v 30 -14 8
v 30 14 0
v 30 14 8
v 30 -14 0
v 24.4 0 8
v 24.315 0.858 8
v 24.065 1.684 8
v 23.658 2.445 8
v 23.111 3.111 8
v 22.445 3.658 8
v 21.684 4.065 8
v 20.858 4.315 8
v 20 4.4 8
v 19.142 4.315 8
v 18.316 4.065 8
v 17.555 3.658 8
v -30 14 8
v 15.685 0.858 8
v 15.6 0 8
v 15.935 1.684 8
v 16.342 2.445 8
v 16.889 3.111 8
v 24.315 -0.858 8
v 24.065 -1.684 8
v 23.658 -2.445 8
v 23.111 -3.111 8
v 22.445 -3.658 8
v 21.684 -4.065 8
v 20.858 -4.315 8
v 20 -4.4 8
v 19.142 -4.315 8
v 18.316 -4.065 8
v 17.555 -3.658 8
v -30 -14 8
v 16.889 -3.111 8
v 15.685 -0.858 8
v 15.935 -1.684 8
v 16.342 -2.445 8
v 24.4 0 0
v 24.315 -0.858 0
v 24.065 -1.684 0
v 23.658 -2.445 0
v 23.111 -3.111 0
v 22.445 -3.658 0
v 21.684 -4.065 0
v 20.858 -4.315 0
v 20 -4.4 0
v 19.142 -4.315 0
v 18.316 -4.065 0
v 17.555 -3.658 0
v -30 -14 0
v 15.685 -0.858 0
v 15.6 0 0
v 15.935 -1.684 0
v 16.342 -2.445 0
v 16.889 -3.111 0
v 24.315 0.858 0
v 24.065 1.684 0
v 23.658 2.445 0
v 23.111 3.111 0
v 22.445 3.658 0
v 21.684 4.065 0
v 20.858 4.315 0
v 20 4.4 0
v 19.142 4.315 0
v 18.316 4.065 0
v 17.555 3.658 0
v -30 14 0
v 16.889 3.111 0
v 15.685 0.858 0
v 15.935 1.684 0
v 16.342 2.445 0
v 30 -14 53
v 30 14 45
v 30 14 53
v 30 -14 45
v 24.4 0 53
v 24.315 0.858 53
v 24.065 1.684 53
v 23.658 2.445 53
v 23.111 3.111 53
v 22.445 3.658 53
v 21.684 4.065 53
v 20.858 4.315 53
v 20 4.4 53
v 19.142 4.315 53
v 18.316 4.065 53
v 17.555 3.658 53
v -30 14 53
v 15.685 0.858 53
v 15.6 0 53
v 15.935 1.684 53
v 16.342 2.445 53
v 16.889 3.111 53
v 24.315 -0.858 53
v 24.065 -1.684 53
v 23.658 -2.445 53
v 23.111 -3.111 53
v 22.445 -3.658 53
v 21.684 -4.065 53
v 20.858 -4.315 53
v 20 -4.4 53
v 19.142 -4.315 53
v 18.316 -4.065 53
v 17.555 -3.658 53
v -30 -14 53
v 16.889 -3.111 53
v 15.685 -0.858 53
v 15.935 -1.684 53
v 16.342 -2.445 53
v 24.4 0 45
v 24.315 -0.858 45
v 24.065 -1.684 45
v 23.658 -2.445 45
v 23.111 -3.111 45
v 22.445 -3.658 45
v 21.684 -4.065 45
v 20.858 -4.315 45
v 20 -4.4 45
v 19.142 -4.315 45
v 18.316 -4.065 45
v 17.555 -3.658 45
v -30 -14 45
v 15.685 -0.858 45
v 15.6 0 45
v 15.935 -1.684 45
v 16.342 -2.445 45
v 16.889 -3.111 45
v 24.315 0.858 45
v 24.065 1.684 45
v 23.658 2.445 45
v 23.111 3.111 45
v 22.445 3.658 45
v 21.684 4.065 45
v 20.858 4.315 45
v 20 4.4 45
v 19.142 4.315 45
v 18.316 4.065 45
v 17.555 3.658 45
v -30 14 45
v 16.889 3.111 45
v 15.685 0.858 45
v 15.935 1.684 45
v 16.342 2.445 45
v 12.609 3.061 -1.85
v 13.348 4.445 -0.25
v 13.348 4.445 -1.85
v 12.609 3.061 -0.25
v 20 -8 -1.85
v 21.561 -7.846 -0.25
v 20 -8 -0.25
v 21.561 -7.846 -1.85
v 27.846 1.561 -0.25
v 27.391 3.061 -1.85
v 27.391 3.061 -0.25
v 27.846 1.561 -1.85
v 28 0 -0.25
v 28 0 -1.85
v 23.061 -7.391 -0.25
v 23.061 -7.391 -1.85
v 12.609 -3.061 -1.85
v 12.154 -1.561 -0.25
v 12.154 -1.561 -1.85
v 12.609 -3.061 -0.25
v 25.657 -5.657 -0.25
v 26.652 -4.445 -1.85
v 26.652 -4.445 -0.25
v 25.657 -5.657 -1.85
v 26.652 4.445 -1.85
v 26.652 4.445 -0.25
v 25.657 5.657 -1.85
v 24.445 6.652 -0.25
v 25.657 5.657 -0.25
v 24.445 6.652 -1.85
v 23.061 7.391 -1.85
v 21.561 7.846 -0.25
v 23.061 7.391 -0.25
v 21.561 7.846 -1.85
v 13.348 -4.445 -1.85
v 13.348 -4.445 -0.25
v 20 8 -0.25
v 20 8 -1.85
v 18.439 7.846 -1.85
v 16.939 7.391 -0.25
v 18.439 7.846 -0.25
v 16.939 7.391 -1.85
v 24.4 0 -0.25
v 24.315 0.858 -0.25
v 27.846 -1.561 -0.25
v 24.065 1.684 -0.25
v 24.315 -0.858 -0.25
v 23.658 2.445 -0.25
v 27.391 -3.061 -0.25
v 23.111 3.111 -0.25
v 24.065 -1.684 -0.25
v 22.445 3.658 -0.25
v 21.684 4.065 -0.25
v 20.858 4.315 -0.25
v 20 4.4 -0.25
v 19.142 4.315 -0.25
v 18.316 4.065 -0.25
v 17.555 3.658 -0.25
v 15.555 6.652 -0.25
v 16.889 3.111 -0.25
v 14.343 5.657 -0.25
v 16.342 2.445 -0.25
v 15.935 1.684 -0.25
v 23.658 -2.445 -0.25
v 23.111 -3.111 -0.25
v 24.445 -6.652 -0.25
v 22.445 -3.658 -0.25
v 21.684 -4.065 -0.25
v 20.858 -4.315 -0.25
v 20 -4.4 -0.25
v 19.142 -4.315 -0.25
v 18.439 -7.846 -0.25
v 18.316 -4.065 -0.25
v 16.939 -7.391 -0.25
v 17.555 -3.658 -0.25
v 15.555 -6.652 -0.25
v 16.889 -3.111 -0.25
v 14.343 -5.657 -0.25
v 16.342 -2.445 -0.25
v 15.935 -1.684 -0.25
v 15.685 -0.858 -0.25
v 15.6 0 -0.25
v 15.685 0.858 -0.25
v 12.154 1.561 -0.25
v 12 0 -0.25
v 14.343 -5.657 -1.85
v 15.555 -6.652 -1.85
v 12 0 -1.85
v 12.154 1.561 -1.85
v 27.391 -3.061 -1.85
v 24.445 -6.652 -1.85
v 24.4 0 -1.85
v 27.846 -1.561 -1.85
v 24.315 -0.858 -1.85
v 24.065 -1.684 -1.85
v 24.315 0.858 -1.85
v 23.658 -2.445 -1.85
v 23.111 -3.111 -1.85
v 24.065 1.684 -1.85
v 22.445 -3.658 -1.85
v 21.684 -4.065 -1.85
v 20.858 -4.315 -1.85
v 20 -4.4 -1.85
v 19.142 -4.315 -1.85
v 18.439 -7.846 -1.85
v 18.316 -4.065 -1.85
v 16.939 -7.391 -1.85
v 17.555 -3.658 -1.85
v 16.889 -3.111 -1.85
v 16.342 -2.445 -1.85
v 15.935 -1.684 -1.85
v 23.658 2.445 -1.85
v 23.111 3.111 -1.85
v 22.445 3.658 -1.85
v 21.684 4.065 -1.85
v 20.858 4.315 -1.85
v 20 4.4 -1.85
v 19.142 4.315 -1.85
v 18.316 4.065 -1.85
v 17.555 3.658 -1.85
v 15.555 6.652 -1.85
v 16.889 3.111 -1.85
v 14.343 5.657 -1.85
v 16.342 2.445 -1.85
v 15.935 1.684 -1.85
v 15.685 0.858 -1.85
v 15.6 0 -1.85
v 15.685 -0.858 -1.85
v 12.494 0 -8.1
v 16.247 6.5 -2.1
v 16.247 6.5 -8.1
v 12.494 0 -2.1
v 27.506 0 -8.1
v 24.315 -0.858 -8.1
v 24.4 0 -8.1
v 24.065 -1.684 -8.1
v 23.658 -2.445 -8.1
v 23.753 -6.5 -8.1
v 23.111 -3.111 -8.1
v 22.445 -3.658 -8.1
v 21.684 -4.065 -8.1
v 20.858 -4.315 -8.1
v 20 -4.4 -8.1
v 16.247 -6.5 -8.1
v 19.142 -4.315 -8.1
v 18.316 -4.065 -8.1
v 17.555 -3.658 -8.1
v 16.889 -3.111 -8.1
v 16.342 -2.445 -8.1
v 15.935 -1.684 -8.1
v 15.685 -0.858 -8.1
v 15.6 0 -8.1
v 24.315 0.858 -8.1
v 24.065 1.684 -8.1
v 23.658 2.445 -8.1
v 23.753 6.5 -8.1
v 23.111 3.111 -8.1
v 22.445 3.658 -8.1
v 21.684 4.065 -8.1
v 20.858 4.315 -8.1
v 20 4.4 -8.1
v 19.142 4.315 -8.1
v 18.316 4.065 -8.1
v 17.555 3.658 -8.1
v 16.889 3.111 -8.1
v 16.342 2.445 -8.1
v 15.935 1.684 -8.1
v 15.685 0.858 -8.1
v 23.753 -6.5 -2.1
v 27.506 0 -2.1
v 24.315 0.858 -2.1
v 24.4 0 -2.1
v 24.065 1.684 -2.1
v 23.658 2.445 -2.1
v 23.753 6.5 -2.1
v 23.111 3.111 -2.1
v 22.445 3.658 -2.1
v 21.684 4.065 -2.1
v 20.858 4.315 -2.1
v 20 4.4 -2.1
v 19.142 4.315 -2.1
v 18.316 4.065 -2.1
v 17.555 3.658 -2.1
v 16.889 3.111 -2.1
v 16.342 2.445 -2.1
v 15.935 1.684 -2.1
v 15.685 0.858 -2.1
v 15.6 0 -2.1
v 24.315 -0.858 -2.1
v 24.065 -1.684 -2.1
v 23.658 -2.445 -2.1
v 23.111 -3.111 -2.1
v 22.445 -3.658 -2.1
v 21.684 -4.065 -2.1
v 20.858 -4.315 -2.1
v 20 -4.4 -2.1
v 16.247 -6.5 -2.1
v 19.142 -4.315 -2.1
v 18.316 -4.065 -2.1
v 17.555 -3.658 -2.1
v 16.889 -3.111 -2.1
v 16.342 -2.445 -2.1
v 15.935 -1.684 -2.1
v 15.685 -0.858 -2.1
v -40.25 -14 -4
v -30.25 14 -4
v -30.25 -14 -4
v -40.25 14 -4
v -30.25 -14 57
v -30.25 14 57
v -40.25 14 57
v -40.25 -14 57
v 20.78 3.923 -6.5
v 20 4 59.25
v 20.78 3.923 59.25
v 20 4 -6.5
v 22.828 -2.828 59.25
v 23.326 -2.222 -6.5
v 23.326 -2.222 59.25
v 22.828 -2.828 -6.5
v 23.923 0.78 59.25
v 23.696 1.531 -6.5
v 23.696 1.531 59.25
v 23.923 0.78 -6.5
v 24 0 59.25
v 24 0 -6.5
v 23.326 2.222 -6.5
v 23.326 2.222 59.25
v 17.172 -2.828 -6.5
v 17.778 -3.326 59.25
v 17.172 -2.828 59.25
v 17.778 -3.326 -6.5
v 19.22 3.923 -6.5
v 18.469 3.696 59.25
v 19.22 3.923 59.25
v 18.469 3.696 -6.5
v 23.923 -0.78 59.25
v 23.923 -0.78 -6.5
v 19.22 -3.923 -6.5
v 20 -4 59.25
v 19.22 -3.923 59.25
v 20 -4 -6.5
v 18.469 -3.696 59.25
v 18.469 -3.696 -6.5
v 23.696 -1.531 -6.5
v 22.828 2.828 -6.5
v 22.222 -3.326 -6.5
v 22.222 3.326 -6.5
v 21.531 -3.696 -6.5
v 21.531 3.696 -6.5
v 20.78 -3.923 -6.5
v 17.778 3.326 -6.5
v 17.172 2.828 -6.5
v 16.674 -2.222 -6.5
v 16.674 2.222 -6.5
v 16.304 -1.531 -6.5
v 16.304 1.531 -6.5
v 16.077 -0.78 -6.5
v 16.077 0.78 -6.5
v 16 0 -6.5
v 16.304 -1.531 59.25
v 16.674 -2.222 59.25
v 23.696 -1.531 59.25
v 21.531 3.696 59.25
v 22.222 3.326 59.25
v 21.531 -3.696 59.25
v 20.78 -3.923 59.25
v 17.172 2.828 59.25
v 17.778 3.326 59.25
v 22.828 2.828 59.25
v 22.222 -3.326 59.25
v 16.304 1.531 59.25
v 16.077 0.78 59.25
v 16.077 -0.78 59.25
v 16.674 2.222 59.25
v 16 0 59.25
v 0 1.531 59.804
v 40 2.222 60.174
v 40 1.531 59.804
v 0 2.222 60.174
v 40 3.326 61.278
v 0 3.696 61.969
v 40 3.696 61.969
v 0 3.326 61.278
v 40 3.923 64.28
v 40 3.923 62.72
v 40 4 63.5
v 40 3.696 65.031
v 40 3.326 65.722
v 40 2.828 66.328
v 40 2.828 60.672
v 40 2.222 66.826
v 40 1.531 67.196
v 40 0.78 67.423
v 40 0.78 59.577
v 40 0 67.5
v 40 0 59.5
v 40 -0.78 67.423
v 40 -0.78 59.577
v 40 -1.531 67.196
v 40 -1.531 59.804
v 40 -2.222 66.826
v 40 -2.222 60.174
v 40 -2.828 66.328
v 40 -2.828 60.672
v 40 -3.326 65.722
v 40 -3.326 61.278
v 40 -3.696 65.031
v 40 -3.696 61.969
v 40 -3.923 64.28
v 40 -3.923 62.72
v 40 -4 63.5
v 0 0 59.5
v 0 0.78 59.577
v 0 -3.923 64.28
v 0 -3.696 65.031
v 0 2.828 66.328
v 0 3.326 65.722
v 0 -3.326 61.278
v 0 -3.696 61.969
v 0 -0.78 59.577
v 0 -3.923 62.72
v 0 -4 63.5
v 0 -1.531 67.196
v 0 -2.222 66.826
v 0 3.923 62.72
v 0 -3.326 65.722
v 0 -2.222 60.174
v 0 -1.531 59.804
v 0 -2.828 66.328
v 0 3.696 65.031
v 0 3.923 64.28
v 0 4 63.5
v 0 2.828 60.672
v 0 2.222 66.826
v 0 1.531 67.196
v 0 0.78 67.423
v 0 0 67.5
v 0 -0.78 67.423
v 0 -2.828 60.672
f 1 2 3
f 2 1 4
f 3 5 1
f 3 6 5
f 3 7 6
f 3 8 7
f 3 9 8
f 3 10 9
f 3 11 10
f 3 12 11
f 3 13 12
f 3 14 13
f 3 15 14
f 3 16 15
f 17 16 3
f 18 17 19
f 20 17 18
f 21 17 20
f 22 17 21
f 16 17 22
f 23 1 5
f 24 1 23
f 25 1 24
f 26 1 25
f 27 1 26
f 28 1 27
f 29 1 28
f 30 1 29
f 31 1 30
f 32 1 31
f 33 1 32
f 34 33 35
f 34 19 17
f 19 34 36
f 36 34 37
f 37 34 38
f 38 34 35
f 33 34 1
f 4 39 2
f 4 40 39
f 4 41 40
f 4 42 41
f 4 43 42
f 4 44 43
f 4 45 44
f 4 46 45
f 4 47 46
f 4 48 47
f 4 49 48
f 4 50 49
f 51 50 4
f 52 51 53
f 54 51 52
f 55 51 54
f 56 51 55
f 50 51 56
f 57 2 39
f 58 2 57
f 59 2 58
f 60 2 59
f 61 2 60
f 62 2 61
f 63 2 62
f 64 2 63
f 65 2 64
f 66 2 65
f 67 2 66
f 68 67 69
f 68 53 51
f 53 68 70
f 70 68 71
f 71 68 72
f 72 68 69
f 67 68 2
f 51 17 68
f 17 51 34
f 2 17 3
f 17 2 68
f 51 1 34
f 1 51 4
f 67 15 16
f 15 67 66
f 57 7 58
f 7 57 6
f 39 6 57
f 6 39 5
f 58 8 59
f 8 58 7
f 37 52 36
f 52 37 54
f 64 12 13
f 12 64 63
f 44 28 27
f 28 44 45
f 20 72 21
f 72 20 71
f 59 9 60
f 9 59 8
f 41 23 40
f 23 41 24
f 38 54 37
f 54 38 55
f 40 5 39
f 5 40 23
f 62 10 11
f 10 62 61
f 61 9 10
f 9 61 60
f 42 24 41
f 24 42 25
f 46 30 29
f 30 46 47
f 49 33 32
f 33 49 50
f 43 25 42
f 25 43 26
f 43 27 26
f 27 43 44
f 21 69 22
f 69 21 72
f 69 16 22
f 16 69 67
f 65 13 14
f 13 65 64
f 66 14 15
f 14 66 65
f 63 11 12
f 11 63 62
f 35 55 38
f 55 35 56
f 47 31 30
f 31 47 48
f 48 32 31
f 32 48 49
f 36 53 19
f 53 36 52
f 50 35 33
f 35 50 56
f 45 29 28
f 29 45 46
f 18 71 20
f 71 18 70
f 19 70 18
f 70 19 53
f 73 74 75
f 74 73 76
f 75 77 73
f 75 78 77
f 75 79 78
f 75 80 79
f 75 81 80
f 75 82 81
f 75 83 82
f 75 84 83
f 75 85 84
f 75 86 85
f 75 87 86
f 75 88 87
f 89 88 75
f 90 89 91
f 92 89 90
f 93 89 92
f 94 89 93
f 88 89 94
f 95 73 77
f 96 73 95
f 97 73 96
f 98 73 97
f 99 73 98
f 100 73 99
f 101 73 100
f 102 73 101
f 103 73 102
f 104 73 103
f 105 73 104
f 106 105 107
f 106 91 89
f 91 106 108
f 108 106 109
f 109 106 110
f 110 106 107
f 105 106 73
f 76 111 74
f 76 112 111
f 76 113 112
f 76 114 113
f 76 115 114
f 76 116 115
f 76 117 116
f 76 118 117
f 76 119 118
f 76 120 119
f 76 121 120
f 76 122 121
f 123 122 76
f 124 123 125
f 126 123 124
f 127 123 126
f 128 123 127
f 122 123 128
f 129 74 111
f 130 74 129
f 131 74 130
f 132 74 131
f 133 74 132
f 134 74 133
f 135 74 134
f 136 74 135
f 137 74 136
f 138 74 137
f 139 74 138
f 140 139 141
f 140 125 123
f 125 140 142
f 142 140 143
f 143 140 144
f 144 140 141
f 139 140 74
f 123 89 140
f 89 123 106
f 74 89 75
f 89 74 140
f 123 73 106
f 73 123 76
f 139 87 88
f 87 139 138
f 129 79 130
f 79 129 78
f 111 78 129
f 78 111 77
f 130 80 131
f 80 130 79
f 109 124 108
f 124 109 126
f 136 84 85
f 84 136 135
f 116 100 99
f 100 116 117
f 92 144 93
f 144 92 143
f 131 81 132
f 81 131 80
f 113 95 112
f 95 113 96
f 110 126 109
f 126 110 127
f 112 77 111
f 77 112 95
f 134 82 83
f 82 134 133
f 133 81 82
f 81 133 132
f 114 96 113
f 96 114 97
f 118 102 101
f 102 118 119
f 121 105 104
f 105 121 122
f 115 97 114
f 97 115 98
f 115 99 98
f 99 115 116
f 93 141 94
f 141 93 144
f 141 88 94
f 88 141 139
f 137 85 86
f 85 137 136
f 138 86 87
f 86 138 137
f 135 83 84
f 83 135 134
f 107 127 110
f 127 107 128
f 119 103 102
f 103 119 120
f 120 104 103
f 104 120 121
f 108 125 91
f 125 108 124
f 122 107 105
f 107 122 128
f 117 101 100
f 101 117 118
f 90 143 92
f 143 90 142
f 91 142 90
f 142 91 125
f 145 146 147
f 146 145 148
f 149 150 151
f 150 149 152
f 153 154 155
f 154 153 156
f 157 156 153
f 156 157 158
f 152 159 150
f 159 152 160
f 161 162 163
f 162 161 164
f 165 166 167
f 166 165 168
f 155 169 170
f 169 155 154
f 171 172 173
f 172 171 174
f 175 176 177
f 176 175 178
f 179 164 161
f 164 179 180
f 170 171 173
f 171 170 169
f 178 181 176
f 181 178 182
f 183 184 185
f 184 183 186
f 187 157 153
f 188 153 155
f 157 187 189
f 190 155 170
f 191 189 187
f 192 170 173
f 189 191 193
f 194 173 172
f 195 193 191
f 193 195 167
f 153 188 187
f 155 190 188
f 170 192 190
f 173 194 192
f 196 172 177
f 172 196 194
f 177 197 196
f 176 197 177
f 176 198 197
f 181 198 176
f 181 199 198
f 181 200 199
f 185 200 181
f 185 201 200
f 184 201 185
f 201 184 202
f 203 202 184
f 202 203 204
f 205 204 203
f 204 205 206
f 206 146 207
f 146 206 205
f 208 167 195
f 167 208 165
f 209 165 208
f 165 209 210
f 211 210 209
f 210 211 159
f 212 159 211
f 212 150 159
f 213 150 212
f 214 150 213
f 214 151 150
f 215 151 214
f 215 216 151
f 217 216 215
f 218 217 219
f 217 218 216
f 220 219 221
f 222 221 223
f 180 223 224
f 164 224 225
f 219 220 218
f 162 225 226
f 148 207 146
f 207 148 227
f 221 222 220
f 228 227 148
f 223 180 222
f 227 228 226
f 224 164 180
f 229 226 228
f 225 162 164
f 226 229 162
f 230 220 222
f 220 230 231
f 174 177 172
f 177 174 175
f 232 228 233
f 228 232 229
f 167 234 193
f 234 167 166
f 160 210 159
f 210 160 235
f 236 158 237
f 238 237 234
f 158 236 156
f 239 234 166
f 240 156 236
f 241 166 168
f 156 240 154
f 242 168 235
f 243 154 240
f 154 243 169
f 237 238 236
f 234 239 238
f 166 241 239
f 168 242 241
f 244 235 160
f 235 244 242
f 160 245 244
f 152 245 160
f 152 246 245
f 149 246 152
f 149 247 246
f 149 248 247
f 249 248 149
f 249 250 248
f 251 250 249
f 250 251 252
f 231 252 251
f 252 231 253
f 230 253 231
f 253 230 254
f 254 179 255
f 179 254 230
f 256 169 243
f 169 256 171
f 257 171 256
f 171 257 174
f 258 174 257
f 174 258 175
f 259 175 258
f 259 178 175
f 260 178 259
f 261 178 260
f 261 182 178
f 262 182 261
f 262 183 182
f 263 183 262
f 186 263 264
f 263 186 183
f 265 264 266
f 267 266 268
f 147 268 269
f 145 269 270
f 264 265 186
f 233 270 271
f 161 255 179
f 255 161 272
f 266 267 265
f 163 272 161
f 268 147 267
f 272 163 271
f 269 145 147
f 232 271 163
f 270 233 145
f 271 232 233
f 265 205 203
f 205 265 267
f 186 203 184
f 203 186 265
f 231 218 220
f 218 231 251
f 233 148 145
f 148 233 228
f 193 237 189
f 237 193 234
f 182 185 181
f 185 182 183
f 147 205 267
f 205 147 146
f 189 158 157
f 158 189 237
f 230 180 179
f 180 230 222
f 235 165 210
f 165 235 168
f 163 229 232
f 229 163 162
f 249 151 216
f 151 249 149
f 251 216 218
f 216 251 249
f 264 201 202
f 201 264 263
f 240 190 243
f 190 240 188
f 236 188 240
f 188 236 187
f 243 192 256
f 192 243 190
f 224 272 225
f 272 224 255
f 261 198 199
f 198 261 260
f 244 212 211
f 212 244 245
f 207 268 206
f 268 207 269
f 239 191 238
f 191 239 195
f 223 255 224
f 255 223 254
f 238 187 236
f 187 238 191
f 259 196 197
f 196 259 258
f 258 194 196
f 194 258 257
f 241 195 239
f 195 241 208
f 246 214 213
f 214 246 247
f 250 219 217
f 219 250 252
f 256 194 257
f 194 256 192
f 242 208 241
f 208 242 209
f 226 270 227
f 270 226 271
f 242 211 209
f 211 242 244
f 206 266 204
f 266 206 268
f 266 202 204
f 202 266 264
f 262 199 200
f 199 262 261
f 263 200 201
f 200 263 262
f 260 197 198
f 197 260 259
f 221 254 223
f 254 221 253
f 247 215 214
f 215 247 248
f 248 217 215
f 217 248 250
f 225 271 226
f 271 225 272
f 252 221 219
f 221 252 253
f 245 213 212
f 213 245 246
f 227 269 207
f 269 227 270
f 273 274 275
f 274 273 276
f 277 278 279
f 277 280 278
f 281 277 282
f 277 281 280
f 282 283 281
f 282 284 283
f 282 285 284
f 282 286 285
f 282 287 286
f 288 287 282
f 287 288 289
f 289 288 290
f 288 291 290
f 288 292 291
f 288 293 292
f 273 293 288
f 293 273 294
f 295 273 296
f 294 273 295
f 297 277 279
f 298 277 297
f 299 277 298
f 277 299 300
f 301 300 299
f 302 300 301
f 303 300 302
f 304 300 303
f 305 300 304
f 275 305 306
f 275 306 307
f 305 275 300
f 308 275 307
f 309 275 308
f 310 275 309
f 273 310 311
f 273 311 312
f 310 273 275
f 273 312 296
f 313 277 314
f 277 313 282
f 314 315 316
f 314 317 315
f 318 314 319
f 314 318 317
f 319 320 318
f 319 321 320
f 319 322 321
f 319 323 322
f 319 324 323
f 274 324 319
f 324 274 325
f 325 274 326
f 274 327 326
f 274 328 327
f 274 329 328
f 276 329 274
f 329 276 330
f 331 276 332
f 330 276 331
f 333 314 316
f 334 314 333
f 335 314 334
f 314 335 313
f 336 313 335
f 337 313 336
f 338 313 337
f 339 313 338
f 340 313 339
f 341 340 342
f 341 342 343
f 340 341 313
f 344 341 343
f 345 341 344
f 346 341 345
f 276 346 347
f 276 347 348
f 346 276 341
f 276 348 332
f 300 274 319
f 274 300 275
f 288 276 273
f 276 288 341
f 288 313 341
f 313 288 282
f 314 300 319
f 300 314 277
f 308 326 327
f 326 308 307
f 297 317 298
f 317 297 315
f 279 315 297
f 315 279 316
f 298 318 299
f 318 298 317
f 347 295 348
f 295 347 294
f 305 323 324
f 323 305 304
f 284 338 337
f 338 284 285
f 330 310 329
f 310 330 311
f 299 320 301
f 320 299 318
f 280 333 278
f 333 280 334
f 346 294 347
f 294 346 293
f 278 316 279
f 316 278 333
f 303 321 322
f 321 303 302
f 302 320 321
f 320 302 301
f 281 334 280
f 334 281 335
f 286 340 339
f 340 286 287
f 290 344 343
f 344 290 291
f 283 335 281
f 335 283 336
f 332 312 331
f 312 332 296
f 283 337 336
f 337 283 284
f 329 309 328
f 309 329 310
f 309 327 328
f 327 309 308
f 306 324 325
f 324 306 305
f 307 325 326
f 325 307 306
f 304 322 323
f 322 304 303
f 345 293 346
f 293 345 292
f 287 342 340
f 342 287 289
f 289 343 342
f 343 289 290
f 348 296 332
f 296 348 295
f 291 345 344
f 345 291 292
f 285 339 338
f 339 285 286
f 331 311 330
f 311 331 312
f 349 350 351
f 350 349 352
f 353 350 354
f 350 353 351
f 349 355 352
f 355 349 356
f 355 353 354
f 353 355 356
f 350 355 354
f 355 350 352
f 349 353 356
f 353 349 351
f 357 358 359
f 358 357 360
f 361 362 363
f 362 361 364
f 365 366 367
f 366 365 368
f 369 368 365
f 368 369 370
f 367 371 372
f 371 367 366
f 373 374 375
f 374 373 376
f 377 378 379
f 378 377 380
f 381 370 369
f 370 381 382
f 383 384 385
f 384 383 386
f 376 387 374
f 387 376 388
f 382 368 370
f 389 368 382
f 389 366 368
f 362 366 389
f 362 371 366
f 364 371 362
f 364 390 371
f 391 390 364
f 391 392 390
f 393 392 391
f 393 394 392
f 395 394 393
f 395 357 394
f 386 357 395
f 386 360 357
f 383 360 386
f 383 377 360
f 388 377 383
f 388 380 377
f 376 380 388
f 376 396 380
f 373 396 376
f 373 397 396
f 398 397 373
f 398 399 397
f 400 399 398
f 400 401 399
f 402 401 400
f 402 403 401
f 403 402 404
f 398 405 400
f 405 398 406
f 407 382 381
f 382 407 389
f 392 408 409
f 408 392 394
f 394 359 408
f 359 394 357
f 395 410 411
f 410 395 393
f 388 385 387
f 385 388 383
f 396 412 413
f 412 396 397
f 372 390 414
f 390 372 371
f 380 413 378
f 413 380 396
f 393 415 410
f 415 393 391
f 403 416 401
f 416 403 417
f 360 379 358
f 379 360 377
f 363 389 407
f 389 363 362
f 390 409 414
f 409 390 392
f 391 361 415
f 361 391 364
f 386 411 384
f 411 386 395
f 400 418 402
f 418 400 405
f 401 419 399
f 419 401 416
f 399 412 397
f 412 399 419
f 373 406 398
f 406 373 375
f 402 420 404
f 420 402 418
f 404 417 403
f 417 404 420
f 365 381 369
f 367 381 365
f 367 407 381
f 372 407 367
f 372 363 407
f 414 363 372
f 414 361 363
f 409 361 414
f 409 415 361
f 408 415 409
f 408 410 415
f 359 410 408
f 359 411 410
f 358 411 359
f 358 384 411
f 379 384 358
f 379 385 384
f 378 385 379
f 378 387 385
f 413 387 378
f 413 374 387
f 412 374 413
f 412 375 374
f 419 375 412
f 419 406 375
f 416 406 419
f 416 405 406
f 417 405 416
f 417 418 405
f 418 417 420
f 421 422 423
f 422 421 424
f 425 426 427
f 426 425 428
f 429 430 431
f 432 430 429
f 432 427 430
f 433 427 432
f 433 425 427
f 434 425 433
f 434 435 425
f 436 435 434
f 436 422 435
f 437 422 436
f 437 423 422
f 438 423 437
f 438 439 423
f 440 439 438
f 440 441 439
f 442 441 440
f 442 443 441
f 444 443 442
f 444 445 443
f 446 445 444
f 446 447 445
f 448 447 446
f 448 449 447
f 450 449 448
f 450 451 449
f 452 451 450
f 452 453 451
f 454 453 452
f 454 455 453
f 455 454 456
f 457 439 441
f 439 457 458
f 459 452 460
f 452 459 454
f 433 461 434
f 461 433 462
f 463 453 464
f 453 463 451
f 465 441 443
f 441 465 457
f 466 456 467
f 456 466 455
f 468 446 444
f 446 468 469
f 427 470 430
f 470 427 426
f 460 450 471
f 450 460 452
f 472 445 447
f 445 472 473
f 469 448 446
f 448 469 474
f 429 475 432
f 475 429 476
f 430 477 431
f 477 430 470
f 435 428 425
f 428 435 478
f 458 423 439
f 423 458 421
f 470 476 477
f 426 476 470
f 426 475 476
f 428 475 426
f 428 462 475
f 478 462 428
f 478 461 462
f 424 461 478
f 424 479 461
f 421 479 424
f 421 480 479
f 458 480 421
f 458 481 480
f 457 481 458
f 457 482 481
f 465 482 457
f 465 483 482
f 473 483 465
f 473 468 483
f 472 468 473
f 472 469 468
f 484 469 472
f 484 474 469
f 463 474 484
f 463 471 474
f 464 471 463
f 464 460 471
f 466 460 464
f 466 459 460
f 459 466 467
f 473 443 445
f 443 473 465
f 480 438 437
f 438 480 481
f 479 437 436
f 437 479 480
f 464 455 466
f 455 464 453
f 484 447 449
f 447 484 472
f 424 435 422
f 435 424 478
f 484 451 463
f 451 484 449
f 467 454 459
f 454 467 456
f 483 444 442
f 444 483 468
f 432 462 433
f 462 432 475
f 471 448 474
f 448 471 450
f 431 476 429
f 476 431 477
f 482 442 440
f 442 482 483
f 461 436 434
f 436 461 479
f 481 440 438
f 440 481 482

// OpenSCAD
$fn = 32;

// ------------------------------------------------------------------------
// C clamp: throat 45 mm, screw d8
// Every part is its own module, assembly() places every instance.
// ------------------------------------------------------------------------

// --- part 1 ---
module clamp_arm() {
  difference() {
    translate([-30, -14, 0]) cube([60, 28, 8]);
    translate([20, 0, -1]) cylinder(h = 10, d = 8.8);
  }
}

// --- part 2 ---
module clamp_spine() {
  difference() {
    translate([-30.5, -14, 0]) cube([61, 28, 10]);
  }
}

// --- part 3 ---
module clamp_screw() {
  translate([0, 0, -32.875]) cylinder(h = 65.75, d = 8);
}

// --- part 4 ---
module clamp_washer() {
  difference() {
      translate([0, 0, 0]) cylinder(h = 1.6, d = 16);
      translate([0, 0, -1]) cylinder(h = 3.6, d = 8.8);
    }
}

// --- part 5 ---
module clamp_nut() {
  difference() {
    linear_extrude(height = 6) polygon(points = [[7.506, 0], [3.753, 6.5], [-3.753, 6.5], [-7.506, 0], [-3.753, -6.5], [3.753, -6.5]]);
    translate([0, 0, -1]) cylinder(h = 8, d = 8.8);
  }
}

// --- part 6 ---
module tommy_bar() {
  translate([0, 0, -20]) cylinder(h = 40, d = 8);
}

// --- assembly ---
module assembly() {
  color([0.80, 0.24, 0.20]) translate([0, 0, 0]) rotate([0, 0, 0]) clamp_arm();
  color([0.20, 0.45, 0.75]) translate([0, 0, 45]) rotate([0, 0, 0]) clamp_arm();
  color([0.25, 0.62, 0.32]) translate([-40.25, 0, 26.5]) rotate([0, 90, 0]) clamp_spine();
  color([0.92, 0.70, 0.18]) translate([20, 0, 26.375]) rotate([0, 0, 0]) clamp_screw();
  color([0.58, 0.35, 0.70]) translate([20, 0, -1.85]) rotate([0, 0, 0]) clamp_washer();
  color([0.16, 0.66, 0.66]) translate([20, 0, -8.1]) rotate([0, 0, 0]) clamp_nut();
  color([0.85, 0.48, 0.18]) translate([20, 0, 63.5]) rotate([0, 90, 0]) tommy_bar();
}

assembly();
